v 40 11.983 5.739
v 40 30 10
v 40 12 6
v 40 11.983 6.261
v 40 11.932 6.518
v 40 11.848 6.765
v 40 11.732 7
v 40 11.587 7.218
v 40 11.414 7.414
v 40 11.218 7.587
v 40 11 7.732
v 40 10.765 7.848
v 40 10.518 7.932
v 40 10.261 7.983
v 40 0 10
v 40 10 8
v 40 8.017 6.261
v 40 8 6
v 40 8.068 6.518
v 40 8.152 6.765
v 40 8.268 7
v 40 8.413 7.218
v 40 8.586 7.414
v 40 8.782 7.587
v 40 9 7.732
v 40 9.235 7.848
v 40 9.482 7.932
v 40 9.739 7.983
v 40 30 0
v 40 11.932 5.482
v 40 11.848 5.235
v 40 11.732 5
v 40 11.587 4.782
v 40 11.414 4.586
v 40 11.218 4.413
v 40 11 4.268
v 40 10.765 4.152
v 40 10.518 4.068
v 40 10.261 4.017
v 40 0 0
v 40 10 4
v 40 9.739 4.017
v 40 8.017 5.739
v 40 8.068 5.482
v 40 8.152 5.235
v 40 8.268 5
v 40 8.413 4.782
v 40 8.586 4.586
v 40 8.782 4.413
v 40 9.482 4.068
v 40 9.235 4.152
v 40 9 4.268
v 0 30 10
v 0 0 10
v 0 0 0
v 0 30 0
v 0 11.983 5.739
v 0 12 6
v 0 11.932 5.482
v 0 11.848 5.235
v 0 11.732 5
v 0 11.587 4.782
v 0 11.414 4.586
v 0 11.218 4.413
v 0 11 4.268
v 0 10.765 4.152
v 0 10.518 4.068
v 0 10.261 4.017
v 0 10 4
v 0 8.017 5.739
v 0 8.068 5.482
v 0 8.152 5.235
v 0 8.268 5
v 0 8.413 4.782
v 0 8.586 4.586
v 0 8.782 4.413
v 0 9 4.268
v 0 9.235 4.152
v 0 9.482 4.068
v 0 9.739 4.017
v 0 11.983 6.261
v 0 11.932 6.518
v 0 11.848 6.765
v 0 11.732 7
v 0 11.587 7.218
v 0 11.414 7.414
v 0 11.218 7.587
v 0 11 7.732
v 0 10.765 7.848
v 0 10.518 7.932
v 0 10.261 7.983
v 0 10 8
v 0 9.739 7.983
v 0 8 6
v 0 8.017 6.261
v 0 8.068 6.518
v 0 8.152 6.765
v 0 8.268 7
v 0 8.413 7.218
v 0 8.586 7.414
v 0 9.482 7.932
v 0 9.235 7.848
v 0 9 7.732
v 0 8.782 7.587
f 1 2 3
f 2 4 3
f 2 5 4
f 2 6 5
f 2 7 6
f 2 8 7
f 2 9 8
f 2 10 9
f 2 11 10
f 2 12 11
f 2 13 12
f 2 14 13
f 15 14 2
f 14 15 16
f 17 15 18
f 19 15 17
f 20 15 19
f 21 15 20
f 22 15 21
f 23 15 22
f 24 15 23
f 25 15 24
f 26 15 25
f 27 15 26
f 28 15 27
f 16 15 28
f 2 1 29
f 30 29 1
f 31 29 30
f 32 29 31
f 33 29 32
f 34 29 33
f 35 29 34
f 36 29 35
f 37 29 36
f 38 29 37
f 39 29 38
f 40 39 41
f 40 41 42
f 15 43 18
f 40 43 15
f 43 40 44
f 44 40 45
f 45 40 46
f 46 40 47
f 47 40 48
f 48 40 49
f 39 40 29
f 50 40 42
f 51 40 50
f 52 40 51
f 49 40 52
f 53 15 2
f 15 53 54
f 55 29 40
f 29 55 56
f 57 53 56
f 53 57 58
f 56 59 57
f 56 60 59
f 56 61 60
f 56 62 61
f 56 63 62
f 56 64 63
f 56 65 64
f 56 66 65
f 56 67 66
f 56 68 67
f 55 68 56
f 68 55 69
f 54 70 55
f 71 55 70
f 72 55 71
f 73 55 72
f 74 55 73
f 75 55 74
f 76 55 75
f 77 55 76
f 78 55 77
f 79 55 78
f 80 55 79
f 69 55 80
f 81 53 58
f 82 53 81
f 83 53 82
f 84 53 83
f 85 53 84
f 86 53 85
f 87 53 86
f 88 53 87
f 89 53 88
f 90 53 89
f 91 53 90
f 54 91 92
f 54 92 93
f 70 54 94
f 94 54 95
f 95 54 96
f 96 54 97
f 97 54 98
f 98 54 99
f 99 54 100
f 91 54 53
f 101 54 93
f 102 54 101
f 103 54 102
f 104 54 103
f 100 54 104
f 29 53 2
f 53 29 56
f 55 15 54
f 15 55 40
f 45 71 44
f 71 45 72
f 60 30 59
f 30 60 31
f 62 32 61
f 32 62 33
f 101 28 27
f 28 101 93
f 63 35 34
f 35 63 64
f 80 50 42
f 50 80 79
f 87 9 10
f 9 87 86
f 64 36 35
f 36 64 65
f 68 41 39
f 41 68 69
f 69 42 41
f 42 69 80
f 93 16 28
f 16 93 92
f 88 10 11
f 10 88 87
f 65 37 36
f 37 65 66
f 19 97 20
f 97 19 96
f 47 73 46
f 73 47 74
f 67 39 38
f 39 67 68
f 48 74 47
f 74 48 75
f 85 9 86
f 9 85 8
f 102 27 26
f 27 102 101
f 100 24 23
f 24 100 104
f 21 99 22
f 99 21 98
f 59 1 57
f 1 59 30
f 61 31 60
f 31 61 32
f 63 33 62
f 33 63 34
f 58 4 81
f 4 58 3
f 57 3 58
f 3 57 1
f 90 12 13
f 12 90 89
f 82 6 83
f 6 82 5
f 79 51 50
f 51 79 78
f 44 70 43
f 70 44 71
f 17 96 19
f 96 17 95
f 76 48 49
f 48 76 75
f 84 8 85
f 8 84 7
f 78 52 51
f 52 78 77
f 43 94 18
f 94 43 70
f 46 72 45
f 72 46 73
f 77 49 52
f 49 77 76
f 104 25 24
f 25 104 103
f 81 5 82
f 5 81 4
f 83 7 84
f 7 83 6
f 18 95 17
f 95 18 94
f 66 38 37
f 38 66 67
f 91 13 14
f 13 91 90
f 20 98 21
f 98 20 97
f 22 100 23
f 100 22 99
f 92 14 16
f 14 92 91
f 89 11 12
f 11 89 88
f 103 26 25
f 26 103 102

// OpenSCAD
// units=mm — generated by scad_emitter.py
// part=unnamed
$fn = 48;

difference() { cube([40, 30, 10]); translate([-0.5, 10, 6]) rotate([0, 90, 0]) cylinder(h=41, r=2, $fn=$fn); }
